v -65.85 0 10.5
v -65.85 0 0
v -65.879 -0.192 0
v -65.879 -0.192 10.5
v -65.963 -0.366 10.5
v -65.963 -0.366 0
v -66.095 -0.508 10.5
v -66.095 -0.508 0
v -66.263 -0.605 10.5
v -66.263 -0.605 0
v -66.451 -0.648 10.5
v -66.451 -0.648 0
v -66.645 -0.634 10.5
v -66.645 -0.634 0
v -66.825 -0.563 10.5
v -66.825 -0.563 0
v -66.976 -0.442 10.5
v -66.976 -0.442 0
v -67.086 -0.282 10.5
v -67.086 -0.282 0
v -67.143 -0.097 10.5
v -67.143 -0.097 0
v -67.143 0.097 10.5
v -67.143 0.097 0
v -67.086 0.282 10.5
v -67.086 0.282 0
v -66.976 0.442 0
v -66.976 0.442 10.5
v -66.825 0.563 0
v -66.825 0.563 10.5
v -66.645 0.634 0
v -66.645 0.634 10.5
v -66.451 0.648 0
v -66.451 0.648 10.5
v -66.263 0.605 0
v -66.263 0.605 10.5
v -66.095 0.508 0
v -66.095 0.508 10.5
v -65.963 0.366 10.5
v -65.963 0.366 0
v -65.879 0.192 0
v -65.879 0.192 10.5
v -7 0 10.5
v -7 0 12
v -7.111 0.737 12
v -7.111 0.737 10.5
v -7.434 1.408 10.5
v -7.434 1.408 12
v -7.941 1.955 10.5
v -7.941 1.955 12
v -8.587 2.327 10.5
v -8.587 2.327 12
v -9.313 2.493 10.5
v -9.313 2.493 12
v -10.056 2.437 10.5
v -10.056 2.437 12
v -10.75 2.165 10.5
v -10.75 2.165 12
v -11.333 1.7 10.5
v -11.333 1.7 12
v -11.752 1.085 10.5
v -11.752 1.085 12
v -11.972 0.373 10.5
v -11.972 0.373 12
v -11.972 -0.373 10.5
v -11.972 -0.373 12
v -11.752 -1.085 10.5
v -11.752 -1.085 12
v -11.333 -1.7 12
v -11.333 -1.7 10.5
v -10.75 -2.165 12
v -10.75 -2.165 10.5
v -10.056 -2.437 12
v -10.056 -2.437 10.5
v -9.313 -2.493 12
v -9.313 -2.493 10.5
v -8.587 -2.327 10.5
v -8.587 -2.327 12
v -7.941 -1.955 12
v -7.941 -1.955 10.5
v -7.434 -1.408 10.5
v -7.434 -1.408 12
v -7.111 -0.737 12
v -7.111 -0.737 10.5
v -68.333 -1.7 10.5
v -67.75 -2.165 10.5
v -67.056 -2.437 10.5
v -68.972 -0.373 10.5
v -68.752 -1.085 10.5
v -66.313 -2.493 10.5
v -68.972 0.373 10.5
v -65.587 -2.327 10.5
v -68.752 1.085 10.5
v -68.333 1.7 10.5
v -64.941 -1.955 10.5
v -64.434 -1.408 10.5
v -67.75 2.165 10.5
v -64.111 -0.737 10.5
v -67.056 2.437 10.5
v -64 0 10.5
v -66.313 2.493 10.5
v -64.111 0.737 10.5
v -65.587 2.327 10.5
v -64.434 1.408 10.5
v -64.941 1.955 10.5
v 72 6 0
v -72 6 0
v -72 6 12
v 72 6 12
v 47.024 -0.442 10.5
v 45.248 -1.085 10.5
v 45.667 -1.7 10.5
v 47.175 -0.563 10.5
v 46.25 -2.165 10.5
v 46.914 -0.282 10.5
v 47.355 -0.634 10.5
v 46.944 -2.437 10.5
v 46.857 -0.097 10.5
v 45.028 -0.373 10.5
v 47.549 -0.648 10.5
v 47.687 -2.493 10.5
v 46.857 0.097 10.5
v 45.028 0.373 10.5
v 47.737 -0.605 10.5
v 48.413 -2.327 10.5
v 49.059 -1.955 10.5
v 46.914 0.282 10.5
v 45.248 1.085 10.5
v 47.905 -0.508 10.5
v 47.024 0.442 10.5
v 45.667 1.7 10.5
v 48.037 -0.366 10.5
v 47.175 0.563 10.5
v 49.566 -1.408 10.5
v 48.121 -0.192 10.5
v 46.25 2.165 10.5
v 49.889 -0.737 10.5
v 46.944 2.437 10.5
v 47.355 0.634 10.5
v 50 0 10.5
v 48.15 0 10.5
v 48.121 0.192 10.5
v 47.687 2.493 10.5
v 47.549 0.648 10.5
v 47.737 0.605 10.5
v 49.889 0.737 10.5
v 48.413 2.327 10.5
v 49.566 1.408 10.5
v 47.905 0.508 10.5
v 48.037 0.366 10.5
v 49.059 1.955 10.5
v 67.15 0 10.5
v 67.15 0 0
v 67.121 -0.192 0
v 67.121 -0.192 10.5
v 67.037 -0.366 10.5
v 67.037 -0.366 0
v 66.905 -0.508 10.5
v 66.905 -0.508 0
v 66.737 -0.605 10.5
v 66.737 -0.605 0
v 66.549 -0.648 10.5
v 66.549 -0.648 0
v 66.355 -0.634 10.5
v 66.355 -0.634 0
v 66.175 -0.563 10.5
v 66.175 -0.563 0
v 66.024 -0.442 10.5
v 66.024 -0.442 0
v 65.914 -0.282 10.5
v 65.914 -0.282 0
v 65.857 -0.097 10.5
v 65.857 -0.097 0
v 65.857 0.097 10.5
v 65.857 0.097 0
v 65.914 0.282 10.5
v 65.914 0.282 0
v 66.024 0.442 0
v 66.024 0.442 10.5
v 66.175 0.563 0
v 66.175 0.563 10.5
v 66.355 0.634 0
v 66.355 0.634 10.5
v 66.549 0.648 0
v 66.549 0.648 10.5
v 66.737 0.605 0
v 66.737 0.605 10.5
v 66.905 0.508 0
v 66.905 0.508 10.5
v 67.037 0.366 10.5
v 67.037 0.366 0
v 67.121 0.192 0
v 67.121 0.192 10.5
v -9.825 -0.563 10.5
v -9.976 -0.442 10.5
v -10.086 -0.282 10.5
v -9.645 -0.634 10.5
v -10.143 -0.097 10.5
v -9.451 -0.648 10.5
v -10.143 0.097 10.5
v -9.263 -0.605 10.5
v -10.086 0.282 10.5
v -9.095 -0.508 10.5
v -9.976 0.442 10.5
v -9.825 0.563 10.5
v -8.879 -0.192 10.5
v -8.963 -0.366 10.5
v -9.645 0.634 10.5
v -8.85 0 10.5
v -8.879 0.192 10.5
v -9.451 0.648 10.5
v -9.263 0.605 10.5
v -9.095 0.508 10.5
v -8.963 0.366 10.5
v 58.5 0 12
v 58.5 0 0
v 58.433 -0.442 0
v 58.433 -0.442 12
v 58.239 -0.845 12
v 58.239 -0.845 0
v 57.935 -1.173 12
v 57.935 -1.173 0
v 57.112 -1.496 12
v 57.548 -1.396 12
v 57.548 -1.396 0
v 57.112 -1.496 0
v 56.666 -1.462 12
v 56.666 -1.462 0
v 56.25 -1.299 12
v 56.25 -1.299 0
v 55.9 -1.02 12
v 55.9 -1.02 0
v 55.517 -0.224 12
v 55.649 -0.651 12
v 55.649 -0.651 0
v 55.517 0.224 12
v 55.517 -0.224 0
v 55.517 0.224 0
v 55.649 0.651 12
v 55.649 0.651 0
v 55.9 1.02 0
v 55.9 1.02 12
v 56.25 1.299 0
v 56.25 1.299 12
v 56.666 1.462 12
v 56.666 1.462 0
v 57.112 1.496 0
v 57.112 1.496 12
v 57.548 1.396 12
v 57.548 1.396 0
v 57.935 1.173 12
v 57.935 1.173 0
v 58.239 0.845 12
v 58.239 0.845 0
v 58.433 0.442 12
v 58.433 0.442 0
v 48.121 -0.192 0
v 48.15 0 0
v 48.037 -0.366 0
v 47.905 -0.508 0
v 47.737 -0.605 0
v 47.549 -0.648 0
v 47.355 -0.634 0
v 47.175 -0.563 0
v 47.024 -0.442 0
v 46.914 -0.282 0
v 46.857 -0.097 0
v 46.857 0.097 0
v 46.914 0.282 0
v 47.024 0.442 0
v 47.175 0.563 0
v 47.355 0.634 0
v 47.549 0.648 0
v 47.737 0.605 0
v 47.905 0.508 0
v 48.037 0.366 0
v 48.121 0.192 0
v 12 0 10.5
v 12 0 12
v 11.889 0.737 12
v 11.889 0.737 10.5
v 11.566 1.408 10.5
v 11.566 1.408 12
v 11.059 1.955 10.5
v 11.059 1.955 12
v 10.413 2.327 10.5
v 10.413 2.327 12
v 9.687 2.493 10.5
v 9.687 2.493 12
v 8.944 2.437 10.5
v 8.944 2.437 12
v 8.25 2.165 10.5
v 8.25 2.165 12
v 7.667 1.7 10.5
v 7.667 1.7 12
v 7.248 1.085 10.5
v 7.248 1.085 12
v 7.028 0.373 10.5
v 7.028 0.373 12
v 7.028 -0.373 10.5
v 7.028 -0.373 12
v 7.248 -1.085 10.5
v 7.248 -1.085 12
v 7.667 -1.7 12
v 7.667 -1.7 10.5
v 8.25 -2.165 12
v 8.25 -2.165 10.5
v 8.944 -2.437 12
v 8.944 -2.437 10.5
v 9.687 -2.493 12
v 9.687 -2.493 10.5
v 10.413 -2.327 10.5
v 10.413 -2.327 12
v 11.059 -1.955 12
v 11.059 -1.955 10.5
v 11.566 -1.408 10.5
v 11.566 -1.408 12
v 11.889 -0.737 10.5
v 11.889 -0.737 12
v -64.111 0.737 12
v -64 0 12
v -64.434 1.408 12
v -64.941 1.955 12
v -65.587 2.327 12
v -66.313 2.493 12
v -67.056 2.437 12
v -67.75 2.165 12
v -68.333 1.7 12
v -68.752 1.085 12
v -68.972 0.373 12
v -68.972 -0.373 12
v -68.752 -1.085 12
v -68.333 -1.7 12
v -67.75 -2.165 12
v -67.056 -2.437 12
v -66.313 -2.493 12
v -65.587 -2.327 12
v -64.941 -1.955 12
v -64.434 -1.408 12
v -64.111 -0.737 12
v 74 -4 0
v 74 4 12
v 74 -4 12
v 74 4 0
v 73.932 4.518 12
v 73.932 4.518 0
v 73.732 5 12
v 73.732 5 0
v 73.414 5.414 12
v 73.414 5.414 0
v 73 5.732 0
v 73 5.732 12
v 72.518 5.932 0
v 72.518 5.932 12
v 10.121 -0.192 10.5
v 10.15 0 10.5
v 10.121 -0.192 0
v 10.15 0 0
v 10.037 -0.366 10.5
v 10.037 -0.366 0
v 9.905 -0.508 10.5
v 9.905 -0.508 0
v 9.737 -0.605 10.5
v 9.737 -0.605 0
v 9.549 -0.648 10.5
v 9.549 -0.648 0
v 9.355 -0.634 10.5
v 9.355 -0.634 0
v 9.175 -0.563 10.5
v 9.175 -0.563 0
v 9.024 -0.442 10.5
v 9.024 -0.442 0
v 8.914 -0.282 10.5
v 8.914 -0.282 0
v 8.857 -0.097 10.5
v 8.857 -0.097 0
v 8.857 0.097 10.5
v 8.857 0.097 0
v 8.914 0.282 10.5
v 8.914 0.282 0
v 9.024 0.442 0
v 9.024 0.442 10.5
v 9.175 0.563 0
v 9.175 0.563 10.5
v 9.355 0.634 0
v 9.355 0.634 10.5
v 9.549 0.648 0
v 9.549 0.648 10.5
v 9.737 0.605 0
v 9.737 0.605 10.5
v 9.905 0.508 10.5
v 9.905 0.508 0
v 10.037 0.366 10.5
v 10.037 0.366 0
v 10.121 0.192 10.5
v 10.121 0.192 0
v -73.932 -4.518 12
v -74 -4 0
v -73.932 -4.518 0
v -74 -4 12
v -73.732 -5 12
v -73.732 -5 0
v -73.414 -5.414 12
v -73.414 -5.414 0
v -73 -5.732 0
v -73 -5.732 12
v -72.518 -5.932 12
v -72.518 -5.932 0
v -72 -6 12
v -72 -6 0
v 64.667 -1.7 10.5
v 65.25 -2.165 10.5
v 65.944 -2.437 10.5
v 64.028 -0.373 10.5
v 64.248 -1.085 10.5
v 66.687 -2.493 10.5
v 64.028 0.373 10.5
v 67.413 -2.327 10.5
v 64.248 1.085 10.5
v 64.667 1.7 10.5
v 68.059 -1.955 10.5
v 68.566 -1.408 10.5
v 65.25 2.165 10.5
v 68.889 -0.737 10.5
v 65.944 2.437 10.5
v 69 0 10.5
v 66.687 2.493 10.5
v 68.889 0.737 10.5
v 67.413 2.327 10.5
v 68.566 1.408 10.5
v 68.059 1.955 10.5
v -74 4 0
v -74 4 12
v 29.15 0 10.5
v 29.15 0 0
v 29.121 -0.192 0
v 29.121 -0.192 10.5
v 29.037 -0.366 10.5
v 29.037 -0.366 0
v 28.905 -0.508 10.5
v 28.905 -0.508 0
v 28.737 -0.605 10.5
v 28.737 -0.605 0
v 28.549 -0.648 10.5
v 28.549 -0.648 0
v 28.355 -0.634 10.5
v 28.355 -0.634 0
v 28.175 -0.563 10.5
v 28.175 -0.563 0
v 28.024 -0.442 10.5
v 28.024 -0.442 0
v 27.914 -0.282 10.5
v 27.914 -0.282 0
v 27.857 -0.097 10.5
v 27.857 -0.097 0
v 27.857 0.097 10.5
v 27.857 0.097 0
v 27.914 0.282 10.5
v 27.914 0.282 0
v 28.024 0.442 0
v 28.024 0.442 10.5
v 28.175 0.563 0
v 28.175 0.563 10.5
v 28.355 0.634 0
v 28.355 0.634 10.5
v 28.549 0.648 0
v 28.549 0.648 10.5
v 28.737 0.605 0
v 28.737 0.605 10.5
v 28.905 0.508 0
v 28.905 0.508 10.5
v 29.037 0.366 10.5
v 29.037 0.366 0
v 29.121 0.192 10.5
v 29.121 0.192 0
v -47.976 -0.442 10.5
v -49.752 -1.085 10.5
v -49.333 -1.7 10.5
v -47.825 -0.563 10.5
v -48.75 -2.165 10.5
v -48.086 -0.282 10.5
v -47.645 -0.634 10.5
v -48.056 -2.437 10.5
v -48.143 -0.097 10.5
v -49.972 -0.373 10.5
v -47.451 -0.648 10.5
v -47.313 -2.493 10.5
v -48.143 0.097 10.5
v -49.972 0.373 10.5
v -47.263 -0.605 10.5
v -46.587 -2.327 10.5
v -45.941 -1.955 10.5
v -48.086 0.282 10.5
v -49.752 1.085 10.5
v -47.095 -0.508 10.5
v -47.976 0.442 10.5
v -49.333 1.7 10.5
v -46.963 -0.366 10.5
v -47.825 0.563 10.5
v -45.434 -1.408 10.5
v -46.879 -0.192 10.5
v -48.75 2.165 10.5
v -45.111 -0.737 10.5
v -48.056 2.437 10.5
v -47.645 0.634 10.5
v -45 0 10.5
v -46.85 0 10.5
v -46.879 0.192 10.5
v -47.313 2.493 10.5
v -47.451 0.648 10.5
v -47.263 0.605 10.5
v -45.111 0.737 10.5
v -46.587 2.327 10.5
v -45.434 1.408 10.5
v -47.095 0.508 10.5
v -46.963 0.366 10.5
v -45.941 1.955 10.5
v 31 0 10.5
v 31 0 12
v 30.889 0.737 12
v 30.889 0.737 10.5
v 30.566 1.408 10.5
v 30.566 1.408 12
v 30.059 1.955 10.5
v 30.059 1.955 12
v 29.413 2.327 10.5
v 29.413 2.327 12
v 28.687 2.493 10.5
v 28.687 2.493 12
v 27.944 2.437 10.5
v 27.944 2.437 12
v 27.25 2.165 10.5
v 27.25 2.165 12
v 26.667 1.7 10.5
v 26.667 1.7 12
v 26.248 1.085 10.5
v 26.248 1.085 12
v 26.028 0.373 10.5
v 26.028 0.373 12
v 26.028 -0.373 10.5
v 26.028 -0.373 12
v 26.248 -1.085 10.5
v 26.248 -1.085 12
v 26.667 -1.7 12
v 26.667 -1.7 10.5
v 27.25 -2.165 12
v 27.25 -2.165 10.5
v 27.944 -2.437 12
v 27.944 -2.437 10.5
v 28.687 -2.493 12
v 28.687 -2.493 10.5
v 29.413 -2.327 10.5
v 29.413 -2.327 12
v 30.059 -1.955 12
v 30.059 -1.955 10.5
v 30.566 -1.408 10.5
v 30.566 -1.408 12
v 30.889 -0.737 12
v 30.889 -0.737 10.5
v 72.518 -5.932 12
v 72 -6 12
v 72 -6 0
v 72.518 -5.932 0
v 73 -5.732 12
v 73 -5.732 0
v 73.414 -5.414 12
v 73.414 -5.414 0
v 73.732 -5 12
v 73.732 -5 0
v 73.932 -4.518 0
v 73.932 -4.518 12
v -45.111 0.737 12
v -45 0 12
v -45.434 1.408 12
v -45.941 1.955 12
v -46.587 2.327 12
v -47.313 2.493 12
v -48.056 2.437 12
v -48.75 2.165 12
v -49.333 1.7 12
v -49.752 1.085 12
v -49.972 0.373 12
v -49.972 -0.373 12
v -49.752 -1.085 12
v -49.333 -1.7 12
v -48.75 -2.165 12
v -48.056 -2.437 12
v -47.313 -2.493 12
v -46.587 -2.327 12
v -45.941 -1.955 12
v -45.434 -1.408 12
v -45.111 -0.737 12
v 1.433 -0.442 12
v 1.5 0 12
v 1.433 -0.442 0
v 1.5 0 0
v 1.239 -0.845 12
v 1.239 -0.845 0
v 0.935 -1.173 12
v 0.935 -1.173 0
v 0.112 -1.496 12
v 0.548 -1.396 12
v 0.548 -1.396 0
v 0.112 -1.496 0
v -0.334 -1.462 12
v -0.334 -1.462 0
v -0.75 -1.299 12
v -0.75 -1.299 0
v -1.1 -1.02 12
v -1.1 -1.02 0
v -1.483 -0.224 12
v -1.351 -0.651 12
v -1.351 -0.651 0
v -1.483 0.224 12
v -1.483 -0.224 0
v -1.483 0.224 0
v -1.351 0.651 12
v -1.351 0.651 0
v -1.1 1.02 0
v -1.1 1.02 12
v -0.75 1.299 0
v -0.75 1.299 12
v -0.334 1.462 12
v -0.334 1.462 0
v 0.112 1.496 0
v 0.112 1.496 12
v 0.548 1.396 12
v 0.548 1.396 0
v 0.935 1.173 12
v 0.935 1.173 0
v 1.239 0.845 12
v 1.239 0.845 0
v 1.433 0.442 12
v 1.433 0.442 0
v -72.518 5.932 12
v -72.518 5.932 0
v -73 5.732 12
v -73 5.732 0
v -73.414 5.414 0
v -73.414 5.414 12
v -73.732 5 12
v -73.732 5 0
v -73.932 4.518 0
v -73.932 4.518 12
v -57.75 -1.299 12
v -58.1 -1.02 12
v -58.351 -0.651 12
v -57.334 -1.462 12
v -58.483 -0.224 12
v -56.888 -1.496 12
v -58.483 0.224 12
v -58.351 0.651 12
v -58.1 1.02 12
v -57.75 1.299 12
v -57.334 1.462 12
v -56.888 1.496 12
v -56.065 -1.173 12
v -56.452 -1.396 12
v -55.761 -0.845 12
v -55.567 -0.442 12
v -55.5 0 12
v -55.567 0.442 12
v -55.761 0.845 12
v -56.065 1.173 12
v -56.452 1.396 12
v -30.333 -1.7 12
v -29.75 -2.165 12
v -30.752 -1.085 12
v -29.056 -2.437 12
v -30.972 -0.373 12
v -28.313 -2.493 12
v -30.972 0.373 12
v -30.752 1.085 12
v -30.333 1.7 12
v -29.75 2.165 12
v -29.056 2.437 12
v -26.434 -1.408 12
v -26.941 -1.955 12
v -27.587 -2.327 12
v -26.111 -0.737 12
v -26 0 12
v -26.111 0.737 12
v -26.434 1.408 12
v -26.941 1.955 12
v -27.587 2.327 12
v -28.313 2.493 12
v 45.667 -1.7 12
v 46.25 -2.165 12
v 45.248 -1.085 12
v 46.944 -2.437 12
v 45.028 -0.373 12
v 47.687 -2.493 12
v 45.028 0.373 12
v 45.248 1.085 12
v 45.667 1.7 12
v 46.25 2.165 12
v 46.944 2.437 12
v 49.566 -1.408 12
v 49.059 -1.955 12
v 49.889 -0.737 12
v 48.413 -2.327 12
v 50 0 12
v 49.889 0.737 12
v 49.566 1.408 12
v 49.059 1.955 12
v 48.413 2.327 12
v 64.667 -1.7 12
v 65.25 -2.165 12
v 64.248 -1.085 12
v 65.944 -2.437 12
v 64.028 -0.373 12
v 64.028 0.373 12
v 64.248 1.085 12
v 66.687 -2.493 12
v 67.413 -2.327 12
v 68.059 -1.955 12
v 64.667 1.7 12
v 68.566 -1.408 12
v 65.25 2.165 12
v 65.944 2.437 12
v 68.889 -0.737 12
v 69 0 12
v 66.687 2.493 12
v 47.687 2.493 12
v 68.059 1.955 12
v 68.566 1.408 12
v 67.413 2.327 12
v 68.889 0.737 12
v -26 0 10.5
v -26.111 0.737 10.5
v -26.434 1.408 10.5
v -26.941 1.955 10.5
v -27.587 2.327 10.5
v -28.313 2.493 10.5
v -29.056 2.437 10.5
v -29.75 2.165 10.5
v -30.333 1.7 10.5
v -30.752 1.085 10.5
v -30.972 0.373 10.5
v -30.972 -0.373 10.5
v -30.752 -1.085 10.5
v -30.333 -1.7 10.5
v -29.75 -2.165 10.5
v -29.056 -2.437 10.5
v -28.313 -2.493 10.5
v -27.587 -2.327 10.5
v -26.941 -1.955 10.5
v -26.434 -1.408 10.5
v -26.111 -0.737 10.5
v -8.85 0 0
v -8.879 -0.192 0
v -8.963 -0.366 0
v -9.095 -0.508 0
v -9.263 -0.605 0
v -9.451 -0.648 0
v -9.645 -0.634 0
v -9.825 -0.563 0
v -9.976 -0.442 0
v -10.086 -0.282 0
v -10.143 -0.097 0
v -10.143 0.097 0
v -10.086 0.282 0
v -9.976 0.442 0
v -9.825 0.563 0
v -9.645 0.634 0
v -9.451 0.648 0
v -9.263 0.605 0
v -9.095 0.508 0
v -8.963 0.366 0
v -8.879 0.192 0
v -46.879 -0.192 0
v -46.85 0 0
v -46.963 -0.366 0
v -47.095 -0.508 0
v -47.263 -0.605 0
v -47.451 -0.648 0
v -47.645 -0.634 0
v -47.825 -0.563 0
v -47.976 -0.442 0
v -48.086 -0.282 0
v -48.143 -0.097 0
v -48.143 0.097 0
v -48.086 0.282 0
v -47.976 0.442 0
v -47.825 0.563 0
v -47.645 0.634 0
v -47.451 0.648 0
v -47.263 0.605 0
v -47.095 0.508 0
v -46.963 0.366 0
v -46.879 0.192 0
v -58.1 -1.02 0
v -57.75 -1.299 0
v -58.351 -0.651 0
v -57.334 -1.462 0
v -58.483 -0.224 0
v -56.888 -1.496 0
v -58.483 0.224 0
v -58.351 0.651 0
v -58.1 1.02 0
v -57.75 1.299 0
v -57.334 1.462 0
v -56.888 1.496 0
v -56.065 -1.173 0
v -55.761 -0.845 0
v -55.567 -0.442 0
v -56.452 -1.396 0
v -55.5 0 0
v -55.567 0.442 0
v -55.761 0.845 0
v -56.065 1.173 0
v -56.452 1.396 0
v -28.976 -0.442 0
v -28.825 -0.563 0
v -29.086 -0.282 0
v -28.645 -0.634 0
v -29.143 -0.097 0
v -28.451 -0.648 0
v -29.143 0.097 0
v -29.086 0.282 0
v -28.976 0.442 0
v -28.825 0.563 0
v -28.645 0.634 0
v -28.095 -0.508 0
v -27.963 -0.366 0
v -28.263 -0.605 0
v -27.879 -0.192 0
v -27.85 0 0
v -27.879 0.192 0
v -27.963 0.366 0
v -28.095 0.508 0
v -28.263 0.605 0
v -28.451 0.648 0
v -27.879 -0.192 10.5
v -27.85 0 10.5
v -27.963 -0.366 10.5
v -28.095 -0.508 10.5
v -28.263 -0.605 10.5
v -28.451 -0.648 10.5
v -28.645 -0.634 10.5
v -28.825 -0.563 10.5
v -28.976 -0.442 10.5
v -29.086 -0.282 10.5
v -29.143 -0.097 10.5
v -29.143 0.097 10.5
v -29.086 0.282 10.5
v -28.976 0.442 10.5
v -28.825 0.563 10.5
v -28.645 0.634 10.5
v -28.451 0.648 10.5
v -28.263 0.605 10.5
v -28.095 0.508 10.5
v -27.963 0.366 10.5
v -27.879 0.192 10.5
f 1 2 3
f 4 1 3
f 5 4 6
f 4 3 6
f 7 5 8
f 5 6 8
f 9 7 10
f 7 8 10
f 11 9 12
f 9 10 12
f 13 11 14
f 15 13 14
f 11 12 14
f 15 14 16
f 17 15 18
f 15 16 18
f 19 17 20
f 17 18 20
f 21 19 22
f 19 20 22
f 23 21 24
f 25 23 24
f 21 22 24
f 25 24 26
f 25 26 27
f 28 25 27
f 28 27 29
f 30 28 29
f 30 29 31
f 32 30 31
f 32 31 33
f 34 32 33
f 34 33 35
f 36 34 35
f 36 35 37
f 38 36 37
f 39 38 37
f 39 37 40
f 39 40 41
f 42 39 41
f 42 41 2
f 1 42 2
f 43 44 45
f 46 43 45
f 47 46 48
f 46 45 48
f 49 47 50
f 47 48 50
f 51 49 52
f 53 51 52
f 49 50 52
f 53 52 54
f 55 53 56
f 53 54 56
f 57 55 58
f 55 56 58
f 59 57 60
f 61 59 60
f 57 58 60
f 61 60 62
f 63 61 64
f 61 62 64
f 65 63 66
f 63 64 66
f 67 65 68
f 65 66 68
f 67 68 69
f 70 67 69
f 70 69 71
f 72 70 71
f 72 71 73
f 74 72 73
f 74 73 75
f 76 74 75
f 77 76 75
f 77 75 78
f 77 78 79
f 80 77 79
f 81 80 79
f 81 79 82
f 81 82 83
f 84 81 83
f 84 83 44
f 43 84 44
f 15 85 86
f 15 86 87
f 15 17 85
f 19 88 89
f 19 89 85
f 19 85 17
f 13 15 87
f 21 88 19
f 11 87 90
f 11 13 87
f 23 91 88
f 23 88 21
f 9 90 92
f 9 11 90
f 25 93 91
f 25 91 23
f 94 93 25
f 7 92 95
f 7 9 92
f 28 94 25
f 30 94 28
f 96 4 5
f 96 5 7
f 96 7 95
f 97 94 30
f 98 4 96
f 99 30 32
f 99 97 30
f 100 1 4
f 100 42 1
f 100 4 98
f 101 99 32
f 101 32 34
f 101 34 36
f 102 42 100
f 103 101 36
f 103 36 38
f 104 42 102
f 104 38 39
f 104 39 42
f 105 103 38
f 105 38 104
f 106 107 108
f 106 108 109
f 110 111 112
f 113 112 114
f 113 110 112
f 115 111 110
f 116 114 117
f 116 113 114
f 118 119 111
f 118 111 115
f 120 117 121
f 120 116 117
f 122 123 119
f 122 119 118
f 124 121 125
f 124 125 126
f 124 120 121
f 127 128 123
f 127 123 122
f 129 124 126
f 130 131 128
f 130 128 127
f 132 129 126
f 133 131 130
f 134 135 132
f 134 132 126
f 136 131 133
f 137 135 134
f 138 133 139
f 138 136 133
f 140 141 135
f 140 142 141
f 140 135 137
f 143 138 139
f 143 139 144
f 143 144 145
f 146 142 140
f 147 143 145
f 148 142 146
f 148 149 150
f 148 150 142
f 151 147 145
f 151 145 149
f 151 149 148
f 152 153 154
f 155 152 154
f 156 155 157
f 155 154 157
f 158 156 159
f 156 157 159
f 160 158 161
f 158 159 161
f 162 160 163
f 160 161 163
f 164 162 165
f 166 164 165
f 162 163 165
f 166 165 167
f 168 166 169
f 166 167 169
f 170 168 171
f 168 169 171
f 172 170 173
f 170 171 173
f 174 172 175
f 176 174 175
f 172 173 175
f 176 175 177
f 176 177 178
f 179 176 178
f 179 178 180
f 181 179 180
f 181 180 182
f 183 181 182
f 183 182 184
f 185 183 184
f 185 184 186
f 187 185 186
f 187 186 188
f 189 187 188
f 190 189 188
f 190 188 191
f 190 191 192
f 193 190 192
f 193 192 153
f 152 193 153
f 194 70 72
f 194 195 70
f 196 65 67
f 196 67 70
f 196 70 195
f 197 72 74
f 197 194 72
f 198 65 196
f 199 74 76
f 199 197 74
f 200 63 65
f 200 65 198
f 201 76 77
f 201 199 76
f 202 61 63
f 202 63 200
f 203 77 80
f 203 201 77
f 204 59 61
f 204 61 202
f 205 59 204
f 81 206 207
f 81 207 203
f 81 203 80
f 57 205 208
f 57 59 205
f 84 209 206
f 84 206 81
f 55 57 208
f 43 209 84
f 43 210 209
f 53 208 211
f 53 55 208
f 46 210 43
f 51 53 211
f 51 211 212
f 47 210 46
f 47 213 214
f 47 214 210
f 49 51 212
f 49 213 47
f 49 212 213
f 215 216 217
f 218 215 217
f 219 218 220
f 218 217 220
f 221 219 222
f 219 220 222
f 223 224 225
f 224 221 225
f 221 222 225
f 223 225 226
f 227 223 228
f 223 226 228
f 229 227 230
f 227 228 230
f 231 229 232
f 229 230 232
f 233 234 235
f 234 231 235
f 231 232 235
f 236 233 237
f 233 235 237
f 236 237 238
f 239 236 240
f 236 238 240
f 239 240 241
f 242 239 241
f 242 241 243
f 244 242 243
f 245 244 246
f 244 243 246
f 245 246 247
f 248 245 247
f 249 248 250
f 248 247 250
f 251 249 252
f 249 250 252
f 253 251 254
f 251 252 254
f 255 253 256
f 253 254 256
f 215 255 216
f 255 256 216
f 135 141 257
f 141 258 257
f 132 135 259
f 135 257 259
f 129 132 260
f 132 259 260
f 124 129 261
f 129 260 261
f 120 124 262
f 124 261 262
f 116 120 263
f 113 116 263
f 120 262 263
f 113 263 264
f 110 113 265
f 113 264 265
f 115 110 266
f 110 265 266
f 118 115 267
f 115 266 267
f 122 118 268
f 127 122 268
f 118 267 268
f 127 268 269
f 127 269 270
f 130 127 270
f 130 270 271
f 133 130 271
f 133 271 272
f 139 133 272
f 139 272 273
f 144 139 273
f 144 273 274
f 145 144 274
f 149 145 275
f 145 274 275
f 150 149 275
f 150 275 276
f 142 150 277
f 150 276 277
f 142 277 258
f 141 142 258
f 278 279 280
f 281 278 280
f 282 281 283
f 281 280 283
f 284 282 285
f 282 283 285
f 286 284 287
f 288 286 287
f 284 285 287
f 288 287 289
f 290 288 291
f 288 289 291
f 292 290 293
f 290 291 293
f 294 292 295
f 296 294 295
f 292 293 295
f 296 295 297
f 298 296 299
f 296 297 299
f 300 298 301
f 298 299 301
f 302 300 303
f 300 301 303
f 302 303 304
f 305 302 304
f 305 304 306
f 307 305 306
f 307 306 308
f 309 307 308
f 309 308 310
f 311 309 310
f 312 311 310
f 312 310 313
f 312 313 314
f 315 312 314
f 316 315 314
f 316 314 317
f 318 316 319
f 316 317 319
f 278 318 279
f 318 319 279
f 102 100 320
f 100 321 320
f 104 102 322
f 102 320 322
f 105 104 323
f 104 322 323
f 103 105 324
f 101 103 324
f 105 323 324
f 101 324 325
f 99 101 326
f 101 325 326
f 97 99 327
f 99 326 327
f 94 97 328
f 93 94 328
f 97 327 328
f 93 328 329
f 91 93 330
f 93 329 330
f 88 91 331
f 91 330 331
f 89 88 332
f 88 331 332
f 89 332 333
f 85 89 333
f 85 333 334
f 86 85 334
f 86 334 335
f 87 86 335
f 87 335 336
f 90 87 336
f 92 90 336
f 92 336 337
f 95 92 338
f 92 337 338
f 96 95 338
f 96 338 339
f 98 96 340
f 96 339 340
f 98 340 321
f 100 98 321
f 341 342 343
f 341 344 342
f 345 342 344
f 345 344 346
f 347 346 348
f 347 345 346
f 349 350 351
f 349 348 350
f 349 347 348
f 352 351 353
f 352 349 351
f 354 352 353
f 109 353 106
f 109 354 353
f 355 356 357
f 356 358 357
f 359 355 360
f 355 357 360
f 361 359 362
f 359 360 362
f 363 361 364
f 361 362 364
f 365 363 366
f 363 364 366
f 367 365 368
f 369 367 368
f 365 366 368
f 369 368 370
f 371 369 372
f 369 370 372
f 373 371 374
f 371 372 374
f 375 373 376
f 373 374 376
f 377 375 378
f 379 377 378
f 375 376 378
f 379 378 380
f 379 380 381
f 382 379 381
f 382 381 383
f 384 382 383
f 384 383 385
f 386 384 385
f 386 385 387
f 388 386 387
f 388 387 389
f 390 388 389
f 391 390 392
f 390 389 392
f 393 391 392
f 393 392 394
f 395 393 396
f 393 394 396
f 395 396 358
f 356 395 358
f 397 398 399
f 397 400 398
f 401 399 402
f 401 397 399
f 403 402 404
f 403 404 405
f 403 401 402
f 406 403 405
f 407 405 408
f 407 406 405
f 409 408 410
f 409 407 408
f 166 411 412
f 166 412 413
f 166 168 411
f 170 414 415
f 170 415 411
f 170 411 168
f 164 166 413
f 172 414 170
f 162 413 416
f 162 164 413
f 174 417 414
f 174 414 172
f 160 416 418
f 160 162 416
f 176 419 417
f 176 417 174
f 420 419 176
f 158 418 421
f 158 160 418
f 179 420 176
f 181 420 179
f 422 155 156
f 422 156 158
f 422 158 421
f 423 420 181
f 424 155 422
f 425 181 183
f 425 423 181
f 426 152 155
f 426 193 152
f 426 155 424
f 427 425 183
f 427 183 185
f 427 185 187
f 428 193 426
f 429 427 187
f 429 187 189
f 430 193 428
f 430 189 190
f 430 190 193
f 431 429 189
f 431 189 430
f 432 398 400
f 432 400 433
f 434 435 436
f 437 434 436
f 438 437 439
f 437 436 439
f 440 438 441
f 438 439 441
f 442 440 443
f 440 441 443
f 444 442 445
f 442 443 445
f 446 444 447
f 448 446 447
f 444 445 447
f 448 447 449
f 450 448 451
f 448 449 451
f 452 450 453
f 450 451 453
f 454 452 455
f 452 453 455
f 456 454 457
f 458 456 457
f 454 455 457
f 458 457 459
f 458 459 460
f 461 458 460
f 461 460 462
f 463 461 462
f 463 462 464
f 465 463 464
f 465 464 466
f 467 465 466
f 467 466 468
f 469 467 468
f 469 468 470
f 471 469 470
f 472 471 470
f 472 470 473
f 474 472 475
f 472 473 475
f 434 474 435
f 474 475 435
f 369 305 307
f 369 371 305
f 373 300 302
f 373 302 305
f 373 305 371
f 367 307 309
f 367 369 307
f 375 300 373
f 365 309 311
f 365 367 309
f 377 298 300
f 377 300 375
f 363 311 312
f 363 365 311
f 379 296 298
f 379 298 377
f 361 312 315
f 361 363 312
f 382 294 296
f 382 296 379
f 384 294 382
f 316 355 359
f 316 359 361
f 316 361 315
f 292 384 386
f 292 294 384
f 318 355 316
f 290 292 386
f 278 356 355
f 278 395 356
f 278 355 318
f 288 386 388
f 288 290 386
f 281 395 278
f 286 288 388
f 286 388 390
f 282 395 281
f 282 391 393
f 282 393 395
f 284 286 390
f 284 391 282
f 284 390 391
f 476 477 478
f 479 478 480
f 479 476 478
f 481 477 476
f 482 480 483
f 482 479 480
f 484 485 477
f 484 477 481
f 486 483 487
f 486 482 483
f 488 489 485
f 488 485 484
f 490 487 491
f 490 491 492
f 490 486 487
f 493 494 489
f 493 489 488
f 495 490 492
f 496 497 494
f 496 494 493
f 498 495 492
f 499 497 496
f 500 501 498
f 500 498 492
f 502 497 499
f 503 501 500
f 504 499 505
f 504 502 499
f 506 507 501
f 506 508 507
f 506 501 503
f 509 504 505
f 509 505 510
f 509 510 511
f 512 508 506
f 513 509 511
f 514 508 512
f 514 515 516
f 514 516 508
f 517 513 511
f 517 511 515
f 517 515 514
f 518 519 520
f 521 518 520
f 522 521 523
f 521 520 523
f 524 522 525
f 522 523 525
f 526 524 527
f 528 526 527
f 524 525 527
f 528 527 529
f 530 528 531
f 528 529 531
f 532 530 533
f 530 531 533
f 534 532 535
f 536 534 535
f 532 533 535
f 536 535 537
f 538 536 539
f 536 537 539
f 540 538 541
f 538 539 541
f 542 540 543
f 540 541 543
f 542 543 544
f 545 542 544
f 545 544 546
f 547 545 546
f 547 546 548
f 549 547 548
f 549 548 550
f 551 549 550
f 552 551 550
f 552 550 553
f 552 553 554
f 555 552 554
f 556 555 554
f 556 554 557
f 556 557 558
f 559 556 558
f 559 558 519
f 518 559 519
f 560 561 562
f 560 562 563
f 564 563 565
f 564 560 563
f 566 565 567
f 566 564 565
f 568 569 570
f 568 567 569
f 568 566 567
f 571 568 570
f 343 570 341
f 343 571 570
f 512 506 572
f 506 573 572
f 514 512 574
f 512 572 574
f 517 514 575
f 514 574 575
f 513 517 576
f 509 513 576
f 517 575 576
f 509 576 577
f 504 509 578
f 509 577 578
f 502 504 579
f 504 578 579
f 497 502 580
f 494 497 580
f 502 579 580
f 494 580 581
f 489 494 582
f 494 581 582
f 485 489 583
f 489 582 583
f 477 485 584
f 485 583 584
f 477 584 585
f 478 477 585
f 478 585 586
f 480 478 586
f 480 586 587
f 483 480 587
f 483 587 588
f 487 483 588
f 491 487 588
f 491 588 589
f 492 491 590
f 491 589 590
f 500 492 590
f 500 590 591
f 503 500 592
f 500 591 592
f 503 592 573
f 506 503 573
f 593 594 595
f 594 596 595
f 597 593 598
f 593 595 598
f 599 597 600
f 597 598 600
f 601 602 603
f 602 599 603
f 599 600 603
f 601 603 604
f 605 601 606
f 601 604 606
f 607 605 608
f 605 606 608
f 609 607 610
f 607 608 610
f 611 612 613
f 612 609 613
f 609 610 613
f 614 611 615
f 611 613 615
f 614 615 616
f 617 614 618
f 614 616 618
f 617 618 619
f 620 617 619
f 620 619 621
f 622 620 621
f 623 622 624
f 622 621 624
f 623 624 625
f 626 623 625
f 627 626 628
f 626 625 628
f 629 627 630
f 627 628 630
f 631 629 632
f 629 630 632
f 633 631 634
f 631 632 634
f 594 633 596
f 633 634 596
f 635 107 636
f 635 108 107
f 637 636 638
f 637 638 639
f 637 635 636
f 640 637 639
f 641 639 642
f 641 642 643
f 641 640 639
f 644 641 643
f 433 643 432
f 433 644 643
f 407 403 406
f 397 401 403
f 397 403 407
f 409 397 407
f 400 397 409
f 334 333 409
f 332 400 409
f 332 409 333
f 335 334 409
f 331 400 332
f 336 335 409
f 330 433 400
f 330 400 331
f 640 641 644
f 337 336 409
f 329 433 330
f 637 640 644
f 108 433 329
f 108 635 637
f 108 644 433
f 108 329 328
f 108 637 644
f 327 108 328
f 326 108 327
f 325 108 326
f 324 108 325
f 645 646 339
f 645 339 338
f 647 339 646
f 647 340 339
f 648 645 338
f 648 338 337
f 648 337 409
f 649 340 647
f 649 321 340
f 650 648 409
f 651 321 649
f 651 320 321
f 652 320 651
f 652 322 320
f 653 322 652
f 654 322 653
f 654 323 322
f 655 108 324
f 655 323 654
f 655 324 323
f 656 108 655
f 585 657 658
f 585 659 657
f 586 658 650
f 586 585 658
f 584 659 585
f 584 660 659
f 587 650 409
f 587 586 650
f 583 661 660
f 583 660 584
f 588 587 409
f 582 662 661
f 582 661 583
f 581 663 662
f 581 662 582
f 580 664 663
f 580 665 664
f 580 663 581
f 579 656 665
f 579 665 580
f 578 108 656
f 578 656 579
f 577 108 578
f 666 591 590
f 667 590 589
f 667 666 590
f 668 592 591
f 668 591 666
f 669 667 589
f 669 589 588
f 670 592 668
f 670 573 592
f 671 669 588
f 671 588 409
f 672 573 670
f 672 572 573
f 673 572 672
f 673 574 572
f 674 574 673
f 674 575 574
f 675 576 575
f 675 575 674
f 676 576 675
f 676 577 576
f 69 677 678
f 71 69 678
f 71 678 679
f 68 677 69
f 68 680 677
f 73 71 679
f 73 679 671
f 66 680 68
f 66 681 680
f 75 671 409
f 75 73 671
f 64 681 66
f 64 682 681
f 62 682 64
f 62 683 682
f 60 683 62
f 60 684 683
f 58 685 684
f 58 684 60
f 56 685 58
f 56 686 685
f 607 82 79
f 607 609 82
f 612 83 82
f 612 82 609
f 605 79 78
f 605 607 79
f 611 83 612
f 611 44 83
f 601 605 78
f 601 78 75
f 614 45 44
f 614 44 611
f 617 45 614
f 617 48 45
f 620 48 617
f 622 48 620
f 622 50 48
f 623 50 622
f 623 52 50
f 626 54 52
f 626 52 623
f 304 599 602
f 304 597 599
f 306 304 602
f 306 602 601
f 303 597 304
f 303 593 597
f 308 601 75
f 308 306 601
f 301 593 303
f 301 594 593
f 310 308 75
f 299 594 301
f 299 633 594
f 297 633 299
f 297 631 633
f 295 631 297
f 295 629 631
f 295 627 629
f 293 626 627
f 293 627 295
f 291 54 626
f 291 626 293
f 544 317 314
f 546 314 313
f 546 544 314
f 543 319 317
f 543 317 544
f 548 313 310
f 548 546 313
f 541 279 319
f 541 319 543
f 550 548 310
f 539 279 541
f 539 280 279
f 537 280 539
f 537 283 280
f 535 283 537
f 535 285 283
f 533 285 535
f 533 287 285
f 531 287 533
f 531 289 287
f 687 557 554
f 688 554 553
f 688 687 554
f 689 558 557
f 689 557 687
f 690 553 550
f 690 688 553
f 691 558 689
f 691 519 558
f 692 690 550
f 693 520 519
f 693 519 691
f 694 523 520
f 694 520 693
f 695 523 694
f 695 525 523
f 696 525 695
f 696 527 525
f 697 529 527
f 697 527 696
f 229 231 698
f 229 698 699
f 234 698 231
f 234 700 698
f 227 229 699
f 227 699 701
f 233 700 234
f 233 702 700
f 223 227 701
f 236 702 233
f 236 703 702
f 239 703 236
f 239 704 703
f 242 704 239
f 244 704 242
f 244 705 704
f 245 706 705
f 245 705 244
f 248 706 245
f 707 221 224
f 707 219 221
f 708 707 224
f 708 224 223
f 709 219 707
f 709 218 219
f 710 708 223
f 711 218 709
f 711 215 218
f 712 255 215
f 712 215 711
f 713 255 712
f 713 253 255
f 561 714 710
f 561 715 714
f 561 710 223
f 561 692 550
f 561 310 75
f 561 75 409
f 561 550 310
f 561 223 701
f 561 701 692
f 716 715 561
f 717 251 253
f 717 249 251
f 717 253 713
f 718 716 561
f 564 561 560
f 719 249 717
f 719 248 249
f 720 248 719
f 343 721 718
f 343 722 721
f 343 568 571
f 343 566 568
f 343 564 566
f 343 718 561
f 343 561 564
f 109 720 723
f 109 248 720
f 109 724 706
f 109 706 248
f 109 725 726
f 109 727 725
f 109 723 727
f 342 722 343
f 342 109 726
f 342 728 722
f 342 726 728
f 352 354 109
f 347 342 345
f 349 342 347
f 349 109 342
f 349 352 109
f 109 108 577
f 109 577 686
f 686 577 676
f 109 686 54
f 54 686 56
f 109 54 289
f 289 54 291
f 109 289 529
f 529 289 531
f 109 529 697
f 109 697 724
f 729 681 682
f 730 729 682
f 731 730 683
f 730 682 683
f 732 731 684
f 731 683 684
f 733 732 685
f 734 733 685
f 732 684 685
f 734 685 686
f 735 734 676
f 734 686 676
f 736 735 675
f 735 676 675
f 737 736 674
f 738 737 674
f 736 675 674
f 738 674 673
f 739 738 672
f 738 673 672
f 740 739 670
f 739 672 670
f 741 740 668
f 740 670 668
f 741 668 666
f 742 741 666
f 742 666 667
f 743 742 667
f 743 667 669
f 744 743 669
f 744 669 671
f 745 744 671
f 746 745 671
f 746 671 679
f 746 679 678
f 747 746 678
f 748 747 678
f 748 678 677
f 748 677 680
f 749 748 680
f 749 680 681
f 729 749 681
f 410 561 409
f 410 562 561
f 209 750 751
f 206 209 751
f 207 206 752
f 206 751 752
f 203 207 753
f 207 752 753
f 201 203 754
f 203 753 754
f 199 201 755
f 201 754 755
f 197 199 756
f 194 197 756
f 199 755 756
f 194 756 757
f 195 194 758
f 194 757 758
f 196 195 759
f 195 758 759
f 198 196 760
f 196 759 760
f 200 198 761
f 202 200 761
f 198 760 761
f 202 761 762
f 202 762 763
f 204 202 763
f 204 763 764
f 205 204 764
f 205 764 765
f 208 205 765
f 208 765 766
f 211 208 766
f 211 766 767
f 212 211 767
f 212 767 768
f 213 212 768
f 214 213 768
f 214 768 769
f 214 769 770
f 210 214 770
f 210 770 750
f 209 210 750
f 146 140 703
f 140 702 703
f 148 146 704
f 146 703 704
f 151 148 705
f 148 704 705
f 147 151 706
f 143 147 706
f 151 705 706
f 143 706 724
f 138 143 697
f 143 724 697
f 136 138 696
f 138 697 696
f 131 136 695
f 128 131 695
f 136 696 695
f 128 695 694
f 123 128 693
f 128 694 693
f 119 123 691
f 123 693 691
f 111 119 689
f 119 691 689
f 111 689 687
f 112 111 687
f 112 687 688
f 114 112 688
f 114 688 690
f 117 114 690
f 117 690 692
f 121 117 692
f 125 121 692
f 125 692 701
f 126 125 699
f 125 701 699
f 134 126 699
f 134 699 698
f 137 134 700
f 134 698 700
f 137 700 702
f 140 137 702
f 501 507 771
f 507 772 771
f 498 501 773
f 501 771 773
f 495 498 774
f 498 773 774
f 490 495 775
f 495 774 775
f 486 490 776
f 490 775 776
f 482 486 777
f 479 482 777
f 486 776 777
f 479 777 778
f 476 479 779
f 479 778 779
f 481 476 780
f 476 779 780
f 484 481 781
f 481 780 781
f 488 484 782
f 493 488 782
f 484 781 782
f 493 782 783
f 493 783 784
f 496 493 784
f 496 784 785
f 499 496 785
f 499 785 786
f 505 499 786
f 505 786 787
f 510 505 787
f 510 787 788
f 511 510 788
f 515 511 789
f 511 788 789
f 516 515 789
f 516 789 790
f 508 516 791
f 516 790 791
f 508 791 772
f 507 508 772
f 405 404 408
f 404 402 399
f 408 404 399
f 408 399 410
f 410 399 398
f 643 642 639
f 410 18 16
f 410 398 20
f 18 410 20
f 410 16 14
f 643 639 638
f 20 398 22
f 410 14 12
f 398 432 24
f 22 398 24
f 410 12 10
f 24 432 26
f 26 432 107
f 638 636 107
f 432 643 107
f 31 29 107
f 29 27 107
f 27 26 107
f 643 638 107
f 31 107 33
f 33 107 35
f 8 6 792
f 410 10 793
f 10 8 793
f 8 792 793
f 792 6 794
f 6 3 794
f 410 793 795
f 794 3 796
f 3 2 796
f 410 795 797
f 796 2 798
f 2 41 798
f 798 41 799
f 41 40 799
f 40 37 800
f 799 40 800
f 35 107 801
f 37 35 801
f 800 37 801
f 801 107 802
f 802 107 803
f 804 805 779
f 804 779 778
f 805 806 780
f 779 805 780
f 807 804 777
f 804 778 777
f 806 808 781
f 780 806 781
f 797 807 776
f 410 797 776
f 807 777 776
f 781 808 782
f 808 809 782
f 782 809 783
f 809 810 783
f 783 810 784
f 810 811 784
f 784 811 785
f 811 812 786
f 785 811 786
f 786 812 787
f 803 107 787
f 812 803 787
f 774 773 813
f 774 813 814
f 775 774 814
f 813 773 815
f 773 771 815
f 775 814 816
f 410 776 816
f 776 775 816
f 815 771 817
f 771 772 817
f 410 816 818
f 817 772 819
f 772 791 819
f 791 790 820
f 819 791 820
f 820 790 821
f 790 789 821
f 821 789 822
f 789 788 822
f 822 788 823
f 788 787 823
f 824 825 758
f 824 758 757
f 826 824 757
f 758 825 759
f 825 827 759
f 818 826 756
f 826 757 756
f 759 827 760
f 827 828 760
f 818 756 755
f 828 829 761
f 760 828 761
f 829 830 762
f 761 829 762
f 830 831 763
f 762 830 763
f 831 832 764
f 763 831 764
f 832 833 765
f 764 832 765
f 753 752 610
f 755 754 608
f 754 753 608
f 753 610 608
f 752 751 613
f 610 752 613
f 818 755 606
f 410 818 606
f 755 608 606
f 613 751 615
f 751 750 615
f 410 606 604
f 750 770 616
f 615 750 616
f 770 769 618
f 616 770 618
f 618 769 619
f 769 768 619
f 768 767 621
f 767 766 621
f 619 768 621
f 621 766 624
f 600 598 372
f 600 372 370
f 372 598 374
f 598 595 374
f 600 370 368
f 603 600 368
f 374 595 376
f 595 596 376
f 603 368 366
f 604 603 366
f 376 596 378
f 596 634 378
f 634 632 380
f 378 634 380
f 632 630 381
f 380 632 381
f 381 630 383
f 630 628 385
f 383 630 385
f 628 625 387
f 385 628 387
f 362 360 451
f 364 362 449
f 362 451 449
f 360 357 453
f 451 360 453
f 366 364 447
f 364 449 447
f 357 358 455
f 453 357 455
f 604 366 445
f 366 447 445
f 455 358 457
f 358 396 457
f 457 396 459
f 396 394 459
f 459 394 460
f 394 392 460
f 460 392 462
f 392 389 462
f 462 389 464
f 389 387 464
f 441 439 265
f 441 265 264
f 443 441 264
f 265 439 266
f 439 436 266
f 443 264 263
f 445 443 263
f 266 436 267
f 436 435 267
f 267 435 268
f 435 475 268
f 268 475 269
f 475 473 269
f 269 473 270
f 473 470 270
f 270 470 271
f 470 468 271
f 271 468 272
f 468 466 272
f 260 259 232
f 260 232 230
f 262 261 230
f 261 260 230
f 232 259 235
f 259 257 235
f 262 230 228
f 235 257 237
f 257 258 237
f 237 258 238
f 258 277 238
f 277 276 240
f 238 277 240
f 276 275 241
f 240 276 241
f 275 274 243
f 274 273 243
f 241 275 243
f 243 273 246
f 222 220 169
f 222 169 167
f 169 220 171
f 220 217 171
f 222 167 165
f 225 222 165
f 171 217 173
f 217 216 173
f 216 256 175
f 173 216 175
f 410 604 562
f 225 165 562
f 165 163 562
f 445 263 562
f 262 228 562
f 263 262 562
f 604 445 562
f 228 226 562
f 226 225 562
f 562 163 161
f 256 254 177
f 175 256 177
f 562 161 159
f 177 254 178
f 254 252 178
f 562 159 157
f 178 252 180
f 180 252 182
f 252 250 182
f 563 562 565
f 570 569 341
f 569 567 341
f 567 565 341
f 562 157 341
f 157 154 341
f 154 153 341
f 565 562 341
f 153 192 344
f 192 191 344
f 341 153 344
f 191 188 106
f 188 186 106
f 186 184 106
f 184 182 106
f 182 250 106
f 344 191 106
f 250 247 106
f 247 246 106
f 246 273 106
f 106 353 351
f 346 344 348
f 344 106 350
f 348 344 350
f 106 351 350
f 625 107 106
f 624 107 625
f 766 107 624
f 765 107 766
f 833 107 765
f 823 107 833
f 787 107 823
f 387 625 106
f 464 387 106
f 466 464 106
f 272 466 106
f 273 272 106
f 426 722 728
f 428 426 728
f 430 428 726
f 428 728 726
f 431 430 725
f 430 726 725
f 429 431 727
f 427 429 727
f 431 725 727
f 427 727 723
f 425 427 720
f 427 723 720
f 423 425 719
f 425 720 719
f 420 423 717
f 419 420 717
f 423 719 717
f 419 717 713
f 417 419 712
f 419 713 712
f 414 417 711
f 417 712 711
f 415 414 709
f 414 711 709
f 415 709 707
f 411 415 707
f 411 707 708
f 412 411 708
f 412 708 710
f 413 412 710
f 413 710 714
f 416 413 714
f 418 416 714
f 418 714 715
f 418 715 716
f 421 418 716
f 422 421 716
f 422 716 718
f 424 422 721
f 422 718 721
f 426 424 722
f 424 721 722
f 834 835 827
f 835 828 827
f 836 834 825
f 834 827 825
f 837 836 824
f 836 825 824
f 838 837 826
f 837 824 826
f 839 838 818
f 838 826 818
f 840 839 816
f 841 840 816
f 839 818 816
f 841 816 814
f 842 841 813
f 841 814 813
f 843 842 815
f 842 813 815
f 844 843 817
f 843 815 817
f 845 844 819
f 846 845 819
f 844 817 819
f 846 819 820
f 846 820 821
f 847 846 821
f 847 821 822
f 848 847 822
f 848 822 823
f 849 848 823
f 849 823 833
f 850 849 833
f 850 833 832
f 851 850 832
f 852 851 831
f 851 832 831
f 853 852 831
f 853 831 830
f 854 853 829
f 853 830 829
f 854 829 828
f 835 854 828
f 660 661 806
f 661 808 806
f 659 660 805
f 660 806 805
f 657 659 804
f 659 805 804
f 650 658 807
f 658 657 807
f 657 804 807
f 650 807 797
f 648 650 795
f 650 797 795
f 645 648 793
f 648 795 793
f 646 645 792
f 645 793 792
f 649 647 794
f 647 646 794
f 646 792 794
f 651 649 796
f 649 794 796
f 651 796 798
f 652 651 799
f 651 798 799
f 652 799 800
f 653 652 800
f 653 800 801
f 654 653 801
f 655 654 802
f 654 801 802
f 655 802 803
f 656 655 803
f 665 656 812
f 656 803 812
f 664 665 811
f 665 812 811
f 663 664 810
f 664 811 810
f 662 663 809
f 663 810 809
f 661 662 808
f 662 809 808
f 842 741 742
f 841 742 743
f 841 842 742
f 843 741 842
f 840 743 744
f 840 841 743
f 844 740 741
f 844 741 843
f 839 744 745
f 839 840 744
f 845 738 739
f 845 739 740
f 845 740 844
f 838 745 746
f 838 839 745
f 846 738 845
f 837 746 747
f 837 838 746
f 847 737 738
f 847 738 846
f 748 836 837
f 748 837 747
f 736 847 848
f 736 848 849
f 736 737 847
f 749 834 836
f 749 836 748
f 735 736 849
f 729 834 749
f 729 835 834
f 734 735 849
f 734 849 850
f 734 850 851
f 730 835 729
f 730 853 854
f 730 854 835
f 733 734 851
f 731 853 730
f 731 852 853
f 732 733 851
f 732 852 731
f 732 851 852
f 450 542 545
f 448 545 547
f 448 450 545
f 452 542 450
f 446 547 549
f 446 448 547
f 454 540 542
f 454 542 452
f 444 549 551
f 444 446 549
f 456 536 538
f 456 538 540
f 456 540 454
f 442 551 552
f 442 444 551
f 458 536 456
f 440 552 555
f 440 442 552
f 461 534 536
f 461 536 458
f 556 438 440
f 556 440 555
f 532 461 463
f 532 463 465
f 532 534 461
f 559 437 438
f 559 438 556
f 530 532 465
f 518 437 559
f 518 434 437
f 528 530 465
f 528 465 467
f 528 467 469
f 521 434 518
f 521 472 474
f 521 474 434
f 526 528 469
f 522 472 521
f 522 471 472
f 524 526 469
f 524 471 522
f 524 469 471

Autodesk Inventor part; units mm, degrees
ref_plane "YZ Plane" through (0, 0, 0) normal (1, 0, 0) x (0, 1, 0)
ref_plane "XZ Plane" through (0, 0, 0) normal (0, 1, 0) x (-1, 0, 0)
ref_plane "XY Plane" through (0, 0, 0) normal (0, 0, 1) x (1, 0, 0)
sketch "Boceto1" plane through (0, 0, 0) normal (0, 0, 1) x (1, 0, 0)
  line L0 (-74, 6) -> (74, 6)
  line L1 (74, 6) -> (74, -6)
  line L2 (74, -6) -> (-74, -6)
  line L3 (-74, -6) -> (-74, 6)
  circle A0 centre (0, 0) radius 1.5
  circle A1 centre (57, 0) radius 1.5
  circle A2 centre (-57, 0) radius 1.5
  circle A3 centre (-9.5, 0) radius 0.65
  circle A4 centre (9.5, 0) radius 0.65
  circle A5 centre (28.5, 0) radius 0.65
  circle A6 centre (47.5, 0) radius 0.65
  circle A7 centre (66.5, 0) radius 0.65
  circle A8 centre (-28.5, 0) radius 0.65
  circle A9 centre (-47.5, 0) radius 0.65
  circle A10 centre (-66.5, 0) radius 0.65
  point P0 (-74, 0)
  point P1 (0, 6)
  dimension "d0" = 148
  dimension "d1" = 12
  dimension "d2" = 3
  dimension "d3" = 3
  dimension "d4" = 3
  dimension "d5" = 57
  dimension "d6" = 57
  dimension "d7" = 1.3
  dimension "d8" = 1.3
  dimension "d9" = 19
  dimension "d10" = 9.5
  dimension "d13" = 19
  dimension "d20" = 19
extrude "Extrusión1" add sketch "Boceto1" along normal blind 12
sketch "Boceto2" plane through (0, 0, 12) normal (0, 0, 1) x (1, 0, 0)
  circle A0 centre (-66.5, 0) radius 0.65 projected
  circle A1 centre (-66.5, 0) radius 2.5
  line L0 (-78, 0) -> (74, 0) construction
  line L1 (74, -6) -> (74, 6) construction
  circle A2 centre (-47.5, 0) radius 2.5
  circle A3 centre (-28.5, 0) radius 2.5
  circle A4 centre (-9.5, 0) radius 2.5
  circle A5 centre (9.5, 0) radius 2.5
  circle A6 centre (28.5, 0) radius 2.5
  circle A7 centre (47.5, 0) radius 2.5
  circle A8 centre (66.5, 0) radius 2.5
  point P0 (0, 0)
  dimension "d27" = 5
  dimension "d30" = 19
  dimension "d35" = 152
extrude "Extrusión2" cut sketch "Boceto2" against normal blind 1.5 contours A0 | A1 | A2 | A3 | A4 | A5 | A6 | A7 | A8
fillet "Empalme1" radius 2 4 edges at (-74, -6, 6) (74, -6, 6) (74, 6, 6) (-74, 6, 6)
equation "\"d6\" = d5"
equation "\"d8\" = d7"
equation "\"d10\" = 0.5 * d9"
properties part number "Guia fibra 8Ch V2_2"
